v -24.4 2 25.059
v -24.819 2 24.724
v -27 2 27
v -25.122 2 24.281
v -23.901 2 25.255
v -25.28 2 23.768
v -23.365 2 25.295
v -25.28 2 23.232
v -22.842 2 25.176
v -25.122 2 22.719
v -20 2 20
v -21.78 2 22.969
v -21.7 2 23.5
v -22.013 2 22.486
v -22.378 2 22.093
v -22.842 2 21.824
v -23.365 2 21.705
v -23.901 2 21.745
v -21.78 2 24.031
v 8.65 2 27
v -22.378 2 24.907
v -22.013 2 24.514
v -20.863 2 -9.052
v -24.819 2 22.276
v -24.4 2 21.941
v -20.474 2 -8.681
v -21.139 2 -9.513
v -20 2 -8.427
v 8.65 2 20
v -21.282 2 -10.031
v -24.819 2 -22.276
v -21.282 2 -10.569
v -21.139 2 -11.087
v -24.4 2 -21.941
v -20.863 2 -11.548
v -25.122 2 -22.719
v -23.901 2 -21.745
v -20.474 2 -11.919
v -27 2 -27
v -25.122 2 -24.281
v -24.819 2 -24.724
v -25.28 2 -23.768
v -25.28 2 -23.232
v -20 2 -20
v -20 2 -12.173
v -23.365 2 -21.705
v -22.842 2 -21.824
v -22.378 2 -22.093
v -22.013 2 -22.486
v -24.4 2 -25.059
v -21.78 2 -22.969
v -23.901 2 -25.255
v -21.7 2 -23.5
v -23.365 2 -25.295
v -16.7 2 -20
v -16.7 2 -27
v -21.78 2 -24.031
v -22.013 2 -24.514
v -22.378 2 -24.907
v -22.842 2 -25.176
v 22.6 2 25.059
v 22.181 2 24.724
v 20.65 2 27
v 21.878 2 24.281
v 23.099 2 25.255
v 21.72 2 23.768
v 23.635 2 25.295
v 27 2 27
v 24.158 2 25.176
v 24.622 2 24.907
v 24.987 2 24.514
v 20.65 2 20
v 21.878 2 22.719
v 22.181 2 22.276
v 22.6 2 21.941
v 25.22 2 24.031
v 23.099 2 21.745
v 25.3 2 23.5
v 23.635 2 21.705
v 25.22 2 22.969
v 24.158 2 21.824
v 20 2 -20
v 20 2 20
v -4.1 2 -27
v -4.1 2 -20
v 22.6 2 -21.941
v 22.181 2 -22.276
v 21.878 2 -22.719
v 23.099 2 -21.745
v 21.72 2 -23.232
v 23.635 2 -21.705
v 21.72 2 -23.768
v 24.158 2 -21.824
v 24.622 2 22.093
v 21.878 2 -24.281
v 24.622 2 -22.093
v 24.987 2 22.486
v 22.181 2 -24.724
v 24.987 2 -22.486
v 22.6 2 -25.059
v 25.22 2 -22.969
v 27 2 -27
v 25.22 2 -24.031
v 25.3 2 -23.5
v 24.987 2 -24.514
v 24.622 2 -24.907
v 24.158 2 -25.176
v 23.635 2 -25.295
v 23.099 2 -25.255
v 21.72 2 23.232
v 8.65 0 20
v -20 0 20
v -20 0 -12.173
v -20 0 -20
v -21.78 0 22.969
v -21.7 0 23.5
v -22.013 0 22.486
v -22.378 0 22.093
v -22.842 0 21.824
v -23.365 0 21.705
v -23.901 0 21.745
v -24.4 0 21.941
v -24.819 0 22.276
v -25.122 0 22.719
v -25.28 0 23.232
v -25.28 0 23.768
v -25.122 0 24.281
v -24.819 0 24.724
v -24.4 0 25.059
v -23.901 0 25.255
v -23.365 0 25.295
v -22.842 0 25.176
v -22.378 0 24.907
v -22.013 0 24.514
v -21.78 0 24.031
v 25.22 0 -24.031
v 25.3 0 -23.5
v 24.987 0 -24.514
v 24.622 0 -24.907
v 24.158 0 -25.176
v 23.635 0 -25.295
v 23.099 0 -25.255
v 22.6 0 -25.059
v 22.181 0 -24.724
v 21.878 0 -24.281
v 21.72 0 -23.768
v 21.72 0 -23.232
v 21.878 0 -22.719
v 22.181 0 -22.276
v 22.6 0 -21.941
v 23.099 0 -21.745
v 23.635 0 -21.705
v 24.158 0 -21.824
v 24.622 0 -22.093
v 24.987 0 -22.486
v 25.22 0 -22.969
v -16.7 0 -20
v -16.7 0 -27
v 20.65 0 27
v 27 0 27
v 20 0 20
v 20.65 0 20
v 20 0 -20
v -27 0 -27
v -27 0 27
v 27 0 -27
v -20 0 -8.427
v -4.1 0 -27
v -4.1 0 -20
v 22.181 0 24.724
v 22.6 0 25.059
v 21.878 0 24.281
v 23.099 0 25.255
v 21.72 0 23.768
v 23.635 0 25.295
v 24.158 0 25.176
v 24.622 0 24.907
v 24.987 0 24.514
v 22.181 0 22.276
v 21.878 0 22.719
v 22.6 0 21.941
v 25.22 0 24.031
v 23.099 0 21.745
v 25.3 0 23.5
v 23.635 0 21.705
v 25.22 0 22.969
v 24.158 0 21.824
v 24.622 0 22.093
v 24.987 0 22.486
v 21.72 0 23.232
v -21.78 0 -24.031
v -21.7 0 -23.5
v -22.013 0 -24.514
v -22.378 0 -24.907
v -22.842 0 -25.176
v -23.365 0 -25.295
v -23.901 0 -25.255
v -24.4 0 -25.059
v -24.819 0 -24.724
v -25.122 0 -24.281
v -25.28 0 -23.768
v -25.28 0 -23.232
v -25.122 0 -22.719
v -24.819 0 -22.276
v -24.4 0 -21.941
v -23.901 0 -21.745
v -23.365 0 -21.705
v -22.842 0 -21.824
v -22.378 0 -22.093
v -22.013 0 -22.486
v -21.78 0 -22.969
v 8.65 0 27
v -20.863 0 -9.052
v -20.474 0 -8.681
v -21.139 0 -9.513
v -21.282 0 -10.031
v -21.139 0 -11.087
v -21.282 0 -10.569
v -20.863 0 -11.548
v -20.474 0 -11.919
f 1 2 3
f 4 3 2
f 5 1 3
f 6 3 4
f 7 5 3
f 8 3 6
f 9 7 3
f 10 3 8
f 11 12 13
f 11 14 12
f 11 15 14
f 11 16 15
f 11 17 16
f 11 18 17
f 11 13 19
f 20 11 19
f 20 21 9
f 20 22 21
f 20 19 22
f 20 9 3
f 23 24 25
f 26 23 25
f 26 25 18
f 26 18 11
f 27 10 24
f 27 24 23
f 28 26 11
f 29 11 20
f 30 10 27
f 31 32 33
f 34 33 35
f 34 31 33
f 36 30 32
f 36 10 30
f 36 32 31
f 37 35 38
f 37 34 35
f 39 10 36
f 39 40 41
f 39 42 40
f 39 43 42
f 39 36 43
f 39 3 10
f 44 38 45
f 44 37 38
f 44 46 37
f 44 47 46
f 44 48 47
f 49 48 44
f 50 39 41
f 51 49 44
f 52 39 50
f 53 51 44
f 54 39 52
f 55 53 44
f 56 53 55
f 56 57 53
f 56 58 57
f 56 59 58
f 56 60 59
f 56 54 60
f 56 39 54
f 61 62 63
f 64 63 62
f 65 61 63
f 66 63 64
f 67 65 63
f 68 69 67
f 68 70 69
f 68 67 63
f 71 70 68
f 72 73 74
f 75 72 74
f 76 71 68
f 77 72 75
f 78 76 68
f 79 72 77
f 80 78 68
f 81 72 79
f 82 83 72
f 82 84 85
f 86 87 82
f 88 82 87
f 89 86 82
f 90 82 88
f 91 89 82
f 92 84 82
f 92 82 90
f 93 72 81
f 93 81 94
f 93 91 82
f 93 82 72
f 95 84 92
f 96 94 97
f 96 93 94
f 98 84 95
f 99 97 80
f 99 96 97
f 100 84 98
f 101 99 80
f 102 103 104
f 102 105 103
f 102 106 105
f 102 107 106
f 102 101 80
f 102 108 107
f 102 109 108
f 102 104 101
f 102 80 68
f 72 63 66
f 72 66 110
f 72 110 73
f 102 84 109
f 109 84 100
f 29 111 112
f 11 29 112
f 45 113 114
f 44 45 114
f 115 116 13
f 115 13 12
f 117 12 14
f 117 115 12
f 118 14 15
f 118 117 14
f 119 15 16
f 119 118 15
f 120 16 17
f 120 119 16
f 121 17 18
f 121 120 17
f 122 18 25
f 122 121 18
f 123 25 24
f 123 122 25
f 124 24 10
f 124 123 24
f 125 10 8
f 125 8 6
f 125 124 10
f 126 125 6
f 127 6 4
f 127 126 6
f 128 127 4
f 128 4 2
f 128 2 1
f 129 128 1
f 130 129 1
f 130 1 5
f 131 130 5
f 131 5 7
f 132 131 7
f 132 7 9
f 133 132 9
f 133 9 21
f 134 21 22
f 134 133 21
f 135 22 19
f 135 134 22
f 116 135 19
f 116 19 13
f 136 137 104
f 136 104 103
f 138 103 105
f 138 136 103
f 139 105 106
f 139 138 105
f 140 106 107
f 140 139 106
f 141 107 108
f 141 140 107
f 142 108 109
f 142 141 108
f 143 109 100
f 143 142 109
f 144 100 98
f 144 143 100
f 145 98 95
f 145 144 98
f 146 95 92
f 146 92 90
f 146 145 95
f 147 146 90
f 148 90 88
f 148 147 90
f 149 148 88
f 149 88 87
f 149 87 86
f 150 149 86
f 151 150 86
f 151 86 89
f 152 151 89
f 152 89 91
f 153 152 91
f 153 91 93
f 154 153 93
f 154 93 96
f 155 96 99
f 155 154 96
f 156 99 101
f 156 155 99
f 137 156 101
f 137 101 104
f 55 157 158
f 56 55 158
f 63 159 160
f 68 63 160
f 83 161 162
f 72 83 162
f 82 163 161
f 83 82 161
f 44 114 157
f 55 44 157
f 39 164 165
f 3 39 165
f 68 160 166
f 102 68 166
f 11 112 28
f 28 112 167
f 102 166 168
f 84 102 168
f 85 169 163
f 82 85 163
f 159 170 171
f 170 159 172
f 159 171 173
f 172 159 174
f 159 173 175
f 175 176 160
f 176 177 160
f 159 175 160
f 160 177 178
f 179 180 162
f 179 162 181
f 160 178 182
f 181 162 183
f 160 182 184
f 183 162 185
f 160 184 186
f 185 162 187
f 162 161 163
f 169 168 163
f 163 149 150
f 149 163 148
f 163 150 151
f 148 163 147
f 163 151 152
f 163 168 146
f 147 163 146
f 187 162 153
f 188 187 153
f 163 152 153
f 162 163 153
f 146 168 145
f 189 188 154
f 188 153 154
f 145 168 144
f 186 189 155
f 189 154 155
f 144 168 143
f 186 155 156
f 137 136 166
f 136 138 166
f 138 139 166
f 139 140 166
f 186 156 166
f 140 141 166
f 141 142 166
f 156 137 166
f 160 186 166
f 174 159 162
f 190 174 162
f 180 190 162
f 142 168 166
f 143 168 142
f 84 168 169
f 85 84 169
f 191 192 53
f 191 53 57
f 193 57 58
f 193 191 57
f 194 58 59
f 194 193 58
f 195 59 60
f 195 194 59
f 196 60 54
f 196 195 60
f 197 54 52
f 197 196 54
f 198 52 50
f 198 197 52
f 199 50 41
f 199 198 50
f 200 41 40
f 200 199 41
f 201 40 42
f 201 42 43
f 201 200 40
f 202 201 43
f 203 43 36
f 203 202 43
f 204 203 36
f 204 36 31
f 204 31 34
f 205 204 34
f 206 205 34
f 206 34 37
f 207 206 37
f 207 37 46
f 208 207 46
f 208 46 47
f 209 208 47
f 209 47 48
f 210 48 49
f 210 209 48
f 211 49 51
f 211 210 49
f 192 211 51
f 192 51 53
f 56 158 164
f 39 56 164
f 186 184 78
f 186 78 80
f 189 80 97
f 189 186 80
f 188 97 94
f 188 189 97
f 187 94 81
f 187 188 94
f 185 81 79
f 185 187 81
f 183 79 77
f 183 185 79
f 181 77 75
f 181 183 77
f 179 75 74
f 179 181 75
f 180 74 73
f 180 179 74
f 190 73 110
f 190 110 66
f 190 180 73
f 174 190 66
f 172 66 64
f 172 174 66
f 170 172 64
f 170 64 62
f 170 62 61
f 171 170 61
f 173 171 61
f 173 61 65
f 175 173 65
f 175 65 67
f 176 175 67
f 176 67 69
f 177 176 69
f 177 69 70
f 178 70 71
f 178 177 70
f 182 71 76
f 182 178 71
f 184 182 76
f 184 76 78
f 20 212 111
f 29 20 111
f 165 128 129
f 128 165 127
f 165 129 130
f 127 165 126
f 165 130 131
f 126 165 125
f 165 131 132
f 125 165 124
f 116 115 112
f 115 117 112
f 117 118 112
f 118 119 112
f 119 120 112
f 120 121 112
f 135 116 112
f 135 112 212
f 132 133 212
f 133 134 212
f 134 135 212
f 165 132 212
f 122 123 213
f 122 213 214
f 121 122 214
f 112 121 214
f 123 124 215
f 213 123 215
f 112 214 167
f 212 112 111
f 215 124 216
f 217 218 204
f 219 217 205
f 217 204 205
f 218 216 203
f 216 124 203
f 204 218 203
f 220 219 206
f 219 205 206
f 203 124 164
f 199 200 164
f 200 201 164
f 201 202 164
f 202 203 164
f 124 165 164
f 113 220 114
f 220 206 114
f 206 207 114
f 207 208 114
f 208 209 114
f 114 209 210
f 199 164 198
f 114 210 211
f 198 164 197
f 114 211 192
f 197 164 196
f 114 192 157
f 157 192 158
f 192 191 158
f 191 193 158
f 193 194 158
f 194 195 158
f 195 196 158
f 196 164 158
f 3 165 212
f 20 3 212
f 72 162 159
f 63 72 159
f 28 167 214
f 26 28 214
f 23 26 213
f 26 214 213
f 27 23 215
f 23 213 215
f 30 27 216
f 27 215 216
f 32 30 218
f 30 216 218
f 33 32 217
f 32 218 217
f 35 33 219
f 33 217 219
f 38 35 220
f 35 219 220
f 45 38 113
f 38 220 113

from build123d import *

# Parameters (mm, degrees)
SKETCH_3_R        = 1.8
EXTRUDE_2_DEPTH   = 2
EXTRUDE_2_2_DEPTH = 2


with BuildPart() as part:
    # 草图3 → 凸台-拉伸2 (new body)
    with BuildSketch(Plane(origin=(0, 0, 0), x_dir=(1, 0, 0), z_dir=(0, 1, 0))):
        with BuildLine():
            Line((-27, -27), (8.65, -27))
            Line((8.65, -27), (8.65, -20))
            Line((8.65, -20), (-20, -20))
            Line((-20, -20), (-20, 8.4265006))
            ThreePointArc((-20, 8.4265006), (-21.3, 10.3), (-20, 12.1734994))
            Line((-20, 12.1734994), (-20, 20))
            Line((-20, 20), (-16.7, 20))
            Line((-16.7, 20), (-16.7, 27))
            Line((-16.7, 27), (-27, 27))
            Line((-27, 27), (-27, -27))
        make_face()
        with Locations((-23.5, -23.5)):
            Circle(SKETCH_3_R, mode=Mode.SUBTRACT)
        with Locations((-23.5, 23.5)):
            Circle(SKETCH_3_R, mode=Mode.SUBTRACT)
    extrude(amount=EXTRUDE_2_DEPTH)


with BuildPart() as body_2:
    # 草图3 → Extrude 2 2 (new body)
    with BuildSketch(Plane(origin=(0, 0, 0), x_dir=(1, 0, 0), z_dir=(0, 1, 0))):
        Polygon((20, 20), (20, -20), (20.65, -20), (20.65, -27), (27, -27), (27, 27), (-4.1, 27), (-4.1, 20), align=None)
        with Locations((23.5, -23.5)):
            Circle(SKETCH_3_R, mode=Mode.SUBTRACT)
        with Locations((23.5, 23.5)):
            Circle(SKETCH_3_R, mode=Mode.SUBTRACT)
    extrude(amount=EXTRUDE_2_2_DEPTH)


solid = Compound([part.part, body_2.part])
